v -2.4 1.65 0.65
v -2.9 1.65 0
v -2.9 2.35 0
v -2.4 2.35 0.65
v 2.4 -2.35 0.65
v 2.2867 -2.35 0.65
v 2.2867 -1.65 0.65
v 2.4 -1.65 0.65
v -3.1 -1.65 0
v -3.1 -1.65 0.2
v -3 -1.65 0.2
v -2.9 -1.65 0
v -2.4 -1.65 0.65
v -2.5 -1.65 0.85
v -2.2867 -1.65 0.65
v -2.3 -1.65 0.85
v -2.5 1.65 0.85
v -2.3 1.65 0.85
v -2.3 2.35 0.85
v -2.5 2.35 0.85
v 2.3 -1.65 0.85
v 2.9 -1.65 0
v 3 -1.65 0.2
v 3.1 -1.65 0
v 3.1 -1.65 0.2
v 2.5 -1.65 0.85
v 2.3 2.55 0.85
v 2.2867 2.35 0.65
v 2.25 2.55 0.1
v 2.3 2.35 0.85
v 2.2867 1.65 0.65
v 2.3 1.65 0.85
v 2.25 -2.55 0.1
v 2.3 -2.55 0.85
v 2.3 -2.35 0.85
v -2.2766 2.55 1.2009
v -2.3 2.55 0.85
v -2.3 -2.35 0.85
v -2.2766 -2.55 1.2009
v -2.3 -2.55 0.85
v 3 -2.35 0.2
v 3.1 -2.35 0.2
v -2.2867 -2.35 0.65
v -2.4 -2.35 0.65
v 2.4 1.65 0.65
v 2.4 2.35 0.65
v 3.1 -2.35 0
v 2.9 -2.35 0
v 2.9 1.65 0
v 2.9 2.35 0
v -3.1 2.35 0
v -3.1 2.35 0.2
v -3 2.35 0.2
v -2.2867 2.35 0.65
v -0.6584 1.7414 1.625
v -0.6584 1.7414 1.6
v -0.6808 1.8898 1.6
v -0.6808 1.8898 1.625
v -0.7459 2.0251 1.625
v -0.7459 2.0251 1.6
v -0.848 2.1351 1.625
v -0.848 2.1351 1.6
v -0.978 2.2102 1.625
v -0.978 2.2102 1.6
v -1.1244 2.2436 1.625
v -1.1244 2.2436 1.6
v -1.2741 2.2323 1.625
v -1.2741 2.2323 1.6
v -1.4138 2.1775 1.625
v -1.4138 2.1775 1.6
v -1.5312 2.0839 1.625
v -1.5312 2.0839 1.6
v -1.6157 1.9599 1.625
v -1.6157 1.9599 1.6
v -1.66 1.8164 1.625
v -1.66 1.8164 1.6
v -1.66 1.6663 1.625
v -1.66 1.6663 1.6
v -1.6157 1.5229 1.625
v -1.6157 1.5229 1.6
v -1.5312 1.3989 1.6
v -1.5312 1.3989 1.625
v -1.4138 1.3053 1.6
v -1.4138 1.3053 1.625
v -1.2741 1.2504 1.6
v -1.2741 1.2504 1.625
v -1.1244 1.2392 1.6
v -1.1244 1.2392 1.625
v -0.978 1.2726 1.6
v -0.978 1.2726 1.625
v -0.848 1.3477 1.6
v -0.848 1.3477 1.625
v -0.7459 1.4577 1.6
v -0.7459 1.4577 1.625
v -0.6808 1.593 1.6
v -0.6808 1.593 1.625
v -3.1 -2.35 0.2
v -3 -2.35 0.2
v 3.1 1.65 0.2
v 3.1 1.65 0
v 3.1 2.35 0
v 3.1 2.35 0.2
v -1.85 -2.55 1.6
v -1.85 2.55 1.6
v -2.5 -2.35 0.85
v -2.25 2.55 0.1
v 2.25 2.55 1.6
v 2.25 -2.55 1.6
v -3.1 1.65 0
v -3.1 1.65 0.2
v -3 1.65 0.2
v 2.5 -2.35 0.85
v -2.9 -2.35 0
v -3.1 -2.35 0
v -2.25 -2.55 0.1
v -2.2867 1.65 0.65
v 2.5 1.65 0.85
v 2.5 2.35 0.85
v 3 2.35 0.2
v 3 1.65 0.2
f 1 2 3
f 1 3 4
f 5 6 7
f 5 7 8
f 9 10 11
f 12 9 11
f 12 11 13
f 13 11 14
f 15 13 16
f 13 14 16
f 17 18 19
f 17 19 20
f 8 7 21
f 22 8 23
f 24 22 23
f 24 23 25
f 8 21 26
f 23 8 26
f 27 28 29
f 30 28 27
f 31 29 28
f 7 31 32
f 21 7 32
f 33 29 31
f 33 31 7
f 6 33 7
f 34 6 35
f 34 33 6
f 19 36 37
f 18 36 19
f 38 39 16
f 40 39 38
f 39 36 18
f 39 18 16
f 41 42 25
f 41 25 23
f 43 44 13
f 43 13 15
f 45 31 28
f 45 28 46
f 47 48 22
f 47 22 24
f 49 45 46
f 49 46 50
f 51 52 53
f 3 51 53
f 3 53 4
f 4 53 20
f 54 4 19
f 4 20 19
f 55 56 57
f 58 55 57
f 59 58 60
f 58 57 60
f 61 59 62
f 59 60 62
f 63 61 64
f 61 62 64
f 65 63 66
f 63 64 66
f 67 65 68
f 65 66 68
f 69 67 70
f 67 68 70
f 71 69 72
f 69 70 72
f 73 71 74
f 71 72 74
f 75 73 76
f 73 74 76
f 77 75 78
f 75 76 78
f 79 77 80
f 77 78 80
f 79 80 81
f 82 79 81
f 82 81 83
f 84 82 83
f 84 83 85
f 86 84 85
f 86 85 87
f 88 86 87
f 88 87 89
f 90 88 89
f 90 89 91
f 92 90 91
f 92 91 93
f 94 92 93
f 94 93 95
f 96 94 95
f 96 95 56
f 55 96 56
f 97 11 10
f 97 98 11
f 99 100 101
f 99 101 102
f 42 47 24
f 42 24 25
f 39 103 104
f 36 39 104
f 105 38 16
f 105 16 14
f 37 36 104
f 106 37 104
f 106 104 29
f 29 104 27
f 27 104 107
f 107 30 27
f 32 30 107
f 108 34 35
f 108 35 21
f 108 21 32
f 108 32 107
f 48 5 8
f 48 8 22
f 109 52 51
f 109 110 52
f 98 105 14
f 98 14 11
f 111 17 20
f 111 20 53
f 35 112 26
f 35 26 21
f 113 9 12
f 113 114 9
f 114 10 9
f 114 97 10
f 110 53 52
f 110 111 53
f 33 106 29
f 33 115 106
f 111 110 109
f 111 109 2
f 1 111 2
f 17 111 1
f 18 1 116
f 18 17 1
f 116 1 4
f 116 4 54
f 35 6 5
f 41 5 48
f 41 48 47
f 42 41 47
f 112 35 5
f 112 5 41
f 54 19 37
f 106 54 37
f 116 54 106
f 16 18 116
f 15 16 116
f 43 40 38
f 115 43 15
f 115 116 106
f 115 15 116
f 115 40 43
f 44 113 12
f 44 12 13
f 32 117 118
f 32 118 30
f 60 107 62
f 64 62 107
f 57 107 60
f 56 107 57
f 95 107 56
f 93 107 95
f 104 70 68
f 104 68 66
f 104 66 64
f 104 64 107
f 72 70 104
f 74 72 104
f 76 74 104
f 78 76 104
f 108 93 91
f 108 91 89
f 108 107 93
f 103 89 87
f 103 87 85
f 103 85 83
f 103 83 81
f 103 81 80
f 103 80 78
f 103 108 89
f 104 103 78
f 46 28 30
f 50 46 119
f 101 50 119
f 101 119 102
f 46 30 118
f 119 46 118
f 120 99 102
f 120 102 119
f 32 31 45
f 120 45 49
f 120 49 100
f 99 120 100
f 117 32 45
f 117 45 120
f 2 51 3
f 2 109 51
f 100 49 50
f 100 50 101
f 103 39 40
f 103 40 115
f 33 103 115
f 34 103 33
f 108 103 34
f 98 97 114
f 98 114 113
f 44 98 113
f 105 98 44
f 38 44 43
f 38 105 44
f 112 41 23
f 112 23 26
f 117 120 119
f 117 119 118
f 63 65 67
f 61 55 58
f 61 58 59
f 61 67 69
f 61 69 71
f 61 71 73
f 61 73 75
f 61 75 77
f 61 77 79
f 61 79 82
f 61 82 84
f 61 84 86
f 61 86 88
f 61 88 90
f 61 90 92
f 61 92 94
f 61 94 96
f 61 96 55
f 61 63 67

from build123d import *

# Parameters (mm, degrees)
PAD002_DEPTH = 0.35
PAD_DEPTH    = 2.55
CHAMFER_SIZE = 0.4
SKETCH003_R  = 0.503583
PAD003_DEPTH = 0.075
PAD001_DEPTH = 0.35


with BuildPart() as pad002:
    # Sketch002 → Pad002 (new body, symmetric)
    with BuildSketch(Plane.XZ.offset(-2)):
        Polygon((-3.1, 0), (-2.9, 0), (-2.4, 0.65), (2.4, 0.65), (2.9, 0), (3.1, 0), (3.1, 0.2), (3, 0.2), (2.5, 0.85), (-2.5, 0.85), (-3, 0.2), (-3.1, 0.2), align=None)
    extrude(amount=PAD002_DEPTH, both=True)


with BuildPart() as chamfer_body:
    # Sketch → Pad (new body, symmetric)
    with BuildSketch(Plane.XZ):
        Polygon((-2.25, 0.1), (2.25, 0.1), (2.3, 0.85), (2.25, 1.6), (-2.25, 1.6), (-2.3, 0.85), align=None)
    extrude(amount=PAD_DEPTH, both=True)

    # Chamfer
    chamfer_edges = [chamfer_body.edges().sort_by_distance(p)[0] for p in [
        (-2.25, 0, 1.6),
    ]]
    chamfer(chamfer_edges, length=CHAMFER_SIZE)


with BuildPart() as pad003:
    # Sketch003 → Pad003 (new body)
    with BuildSketch(Plane.XY.offset(1.55)):
        with Locations((-1.162023, 1.741391)):
            Circle(SKETCH003_R)
    extrude(amount=PAD003_DEPTH)


with BuildPart() as diode_bridge_vishay_mbls:
    # Sketch001 → Pad001 (new body, symmetric)
    with BuildSketch(Plane.XZ.offset(2)):
        Polygon((-3.1, 0), (-2.9, 0), (-2.4, 0.65), (2.4, 0.65), (2.9, 0), (3.1, 0), (3.1, 0.2), (3, 0.2), (2.5, 0.85), (-2.5, 0.85), (-3, 0.2), (-3.1, 0.2), align=None)
    extrude(amount=PAD001_DEPTH, both=True)

    # Pad001_mp_cp: union Pad002, Chamfer body, Pad003
    add(pad002.part)
    add(chamfer_body.part)
    add(pad003.part)


solid = diode_bridge_vishay_mbls.part
